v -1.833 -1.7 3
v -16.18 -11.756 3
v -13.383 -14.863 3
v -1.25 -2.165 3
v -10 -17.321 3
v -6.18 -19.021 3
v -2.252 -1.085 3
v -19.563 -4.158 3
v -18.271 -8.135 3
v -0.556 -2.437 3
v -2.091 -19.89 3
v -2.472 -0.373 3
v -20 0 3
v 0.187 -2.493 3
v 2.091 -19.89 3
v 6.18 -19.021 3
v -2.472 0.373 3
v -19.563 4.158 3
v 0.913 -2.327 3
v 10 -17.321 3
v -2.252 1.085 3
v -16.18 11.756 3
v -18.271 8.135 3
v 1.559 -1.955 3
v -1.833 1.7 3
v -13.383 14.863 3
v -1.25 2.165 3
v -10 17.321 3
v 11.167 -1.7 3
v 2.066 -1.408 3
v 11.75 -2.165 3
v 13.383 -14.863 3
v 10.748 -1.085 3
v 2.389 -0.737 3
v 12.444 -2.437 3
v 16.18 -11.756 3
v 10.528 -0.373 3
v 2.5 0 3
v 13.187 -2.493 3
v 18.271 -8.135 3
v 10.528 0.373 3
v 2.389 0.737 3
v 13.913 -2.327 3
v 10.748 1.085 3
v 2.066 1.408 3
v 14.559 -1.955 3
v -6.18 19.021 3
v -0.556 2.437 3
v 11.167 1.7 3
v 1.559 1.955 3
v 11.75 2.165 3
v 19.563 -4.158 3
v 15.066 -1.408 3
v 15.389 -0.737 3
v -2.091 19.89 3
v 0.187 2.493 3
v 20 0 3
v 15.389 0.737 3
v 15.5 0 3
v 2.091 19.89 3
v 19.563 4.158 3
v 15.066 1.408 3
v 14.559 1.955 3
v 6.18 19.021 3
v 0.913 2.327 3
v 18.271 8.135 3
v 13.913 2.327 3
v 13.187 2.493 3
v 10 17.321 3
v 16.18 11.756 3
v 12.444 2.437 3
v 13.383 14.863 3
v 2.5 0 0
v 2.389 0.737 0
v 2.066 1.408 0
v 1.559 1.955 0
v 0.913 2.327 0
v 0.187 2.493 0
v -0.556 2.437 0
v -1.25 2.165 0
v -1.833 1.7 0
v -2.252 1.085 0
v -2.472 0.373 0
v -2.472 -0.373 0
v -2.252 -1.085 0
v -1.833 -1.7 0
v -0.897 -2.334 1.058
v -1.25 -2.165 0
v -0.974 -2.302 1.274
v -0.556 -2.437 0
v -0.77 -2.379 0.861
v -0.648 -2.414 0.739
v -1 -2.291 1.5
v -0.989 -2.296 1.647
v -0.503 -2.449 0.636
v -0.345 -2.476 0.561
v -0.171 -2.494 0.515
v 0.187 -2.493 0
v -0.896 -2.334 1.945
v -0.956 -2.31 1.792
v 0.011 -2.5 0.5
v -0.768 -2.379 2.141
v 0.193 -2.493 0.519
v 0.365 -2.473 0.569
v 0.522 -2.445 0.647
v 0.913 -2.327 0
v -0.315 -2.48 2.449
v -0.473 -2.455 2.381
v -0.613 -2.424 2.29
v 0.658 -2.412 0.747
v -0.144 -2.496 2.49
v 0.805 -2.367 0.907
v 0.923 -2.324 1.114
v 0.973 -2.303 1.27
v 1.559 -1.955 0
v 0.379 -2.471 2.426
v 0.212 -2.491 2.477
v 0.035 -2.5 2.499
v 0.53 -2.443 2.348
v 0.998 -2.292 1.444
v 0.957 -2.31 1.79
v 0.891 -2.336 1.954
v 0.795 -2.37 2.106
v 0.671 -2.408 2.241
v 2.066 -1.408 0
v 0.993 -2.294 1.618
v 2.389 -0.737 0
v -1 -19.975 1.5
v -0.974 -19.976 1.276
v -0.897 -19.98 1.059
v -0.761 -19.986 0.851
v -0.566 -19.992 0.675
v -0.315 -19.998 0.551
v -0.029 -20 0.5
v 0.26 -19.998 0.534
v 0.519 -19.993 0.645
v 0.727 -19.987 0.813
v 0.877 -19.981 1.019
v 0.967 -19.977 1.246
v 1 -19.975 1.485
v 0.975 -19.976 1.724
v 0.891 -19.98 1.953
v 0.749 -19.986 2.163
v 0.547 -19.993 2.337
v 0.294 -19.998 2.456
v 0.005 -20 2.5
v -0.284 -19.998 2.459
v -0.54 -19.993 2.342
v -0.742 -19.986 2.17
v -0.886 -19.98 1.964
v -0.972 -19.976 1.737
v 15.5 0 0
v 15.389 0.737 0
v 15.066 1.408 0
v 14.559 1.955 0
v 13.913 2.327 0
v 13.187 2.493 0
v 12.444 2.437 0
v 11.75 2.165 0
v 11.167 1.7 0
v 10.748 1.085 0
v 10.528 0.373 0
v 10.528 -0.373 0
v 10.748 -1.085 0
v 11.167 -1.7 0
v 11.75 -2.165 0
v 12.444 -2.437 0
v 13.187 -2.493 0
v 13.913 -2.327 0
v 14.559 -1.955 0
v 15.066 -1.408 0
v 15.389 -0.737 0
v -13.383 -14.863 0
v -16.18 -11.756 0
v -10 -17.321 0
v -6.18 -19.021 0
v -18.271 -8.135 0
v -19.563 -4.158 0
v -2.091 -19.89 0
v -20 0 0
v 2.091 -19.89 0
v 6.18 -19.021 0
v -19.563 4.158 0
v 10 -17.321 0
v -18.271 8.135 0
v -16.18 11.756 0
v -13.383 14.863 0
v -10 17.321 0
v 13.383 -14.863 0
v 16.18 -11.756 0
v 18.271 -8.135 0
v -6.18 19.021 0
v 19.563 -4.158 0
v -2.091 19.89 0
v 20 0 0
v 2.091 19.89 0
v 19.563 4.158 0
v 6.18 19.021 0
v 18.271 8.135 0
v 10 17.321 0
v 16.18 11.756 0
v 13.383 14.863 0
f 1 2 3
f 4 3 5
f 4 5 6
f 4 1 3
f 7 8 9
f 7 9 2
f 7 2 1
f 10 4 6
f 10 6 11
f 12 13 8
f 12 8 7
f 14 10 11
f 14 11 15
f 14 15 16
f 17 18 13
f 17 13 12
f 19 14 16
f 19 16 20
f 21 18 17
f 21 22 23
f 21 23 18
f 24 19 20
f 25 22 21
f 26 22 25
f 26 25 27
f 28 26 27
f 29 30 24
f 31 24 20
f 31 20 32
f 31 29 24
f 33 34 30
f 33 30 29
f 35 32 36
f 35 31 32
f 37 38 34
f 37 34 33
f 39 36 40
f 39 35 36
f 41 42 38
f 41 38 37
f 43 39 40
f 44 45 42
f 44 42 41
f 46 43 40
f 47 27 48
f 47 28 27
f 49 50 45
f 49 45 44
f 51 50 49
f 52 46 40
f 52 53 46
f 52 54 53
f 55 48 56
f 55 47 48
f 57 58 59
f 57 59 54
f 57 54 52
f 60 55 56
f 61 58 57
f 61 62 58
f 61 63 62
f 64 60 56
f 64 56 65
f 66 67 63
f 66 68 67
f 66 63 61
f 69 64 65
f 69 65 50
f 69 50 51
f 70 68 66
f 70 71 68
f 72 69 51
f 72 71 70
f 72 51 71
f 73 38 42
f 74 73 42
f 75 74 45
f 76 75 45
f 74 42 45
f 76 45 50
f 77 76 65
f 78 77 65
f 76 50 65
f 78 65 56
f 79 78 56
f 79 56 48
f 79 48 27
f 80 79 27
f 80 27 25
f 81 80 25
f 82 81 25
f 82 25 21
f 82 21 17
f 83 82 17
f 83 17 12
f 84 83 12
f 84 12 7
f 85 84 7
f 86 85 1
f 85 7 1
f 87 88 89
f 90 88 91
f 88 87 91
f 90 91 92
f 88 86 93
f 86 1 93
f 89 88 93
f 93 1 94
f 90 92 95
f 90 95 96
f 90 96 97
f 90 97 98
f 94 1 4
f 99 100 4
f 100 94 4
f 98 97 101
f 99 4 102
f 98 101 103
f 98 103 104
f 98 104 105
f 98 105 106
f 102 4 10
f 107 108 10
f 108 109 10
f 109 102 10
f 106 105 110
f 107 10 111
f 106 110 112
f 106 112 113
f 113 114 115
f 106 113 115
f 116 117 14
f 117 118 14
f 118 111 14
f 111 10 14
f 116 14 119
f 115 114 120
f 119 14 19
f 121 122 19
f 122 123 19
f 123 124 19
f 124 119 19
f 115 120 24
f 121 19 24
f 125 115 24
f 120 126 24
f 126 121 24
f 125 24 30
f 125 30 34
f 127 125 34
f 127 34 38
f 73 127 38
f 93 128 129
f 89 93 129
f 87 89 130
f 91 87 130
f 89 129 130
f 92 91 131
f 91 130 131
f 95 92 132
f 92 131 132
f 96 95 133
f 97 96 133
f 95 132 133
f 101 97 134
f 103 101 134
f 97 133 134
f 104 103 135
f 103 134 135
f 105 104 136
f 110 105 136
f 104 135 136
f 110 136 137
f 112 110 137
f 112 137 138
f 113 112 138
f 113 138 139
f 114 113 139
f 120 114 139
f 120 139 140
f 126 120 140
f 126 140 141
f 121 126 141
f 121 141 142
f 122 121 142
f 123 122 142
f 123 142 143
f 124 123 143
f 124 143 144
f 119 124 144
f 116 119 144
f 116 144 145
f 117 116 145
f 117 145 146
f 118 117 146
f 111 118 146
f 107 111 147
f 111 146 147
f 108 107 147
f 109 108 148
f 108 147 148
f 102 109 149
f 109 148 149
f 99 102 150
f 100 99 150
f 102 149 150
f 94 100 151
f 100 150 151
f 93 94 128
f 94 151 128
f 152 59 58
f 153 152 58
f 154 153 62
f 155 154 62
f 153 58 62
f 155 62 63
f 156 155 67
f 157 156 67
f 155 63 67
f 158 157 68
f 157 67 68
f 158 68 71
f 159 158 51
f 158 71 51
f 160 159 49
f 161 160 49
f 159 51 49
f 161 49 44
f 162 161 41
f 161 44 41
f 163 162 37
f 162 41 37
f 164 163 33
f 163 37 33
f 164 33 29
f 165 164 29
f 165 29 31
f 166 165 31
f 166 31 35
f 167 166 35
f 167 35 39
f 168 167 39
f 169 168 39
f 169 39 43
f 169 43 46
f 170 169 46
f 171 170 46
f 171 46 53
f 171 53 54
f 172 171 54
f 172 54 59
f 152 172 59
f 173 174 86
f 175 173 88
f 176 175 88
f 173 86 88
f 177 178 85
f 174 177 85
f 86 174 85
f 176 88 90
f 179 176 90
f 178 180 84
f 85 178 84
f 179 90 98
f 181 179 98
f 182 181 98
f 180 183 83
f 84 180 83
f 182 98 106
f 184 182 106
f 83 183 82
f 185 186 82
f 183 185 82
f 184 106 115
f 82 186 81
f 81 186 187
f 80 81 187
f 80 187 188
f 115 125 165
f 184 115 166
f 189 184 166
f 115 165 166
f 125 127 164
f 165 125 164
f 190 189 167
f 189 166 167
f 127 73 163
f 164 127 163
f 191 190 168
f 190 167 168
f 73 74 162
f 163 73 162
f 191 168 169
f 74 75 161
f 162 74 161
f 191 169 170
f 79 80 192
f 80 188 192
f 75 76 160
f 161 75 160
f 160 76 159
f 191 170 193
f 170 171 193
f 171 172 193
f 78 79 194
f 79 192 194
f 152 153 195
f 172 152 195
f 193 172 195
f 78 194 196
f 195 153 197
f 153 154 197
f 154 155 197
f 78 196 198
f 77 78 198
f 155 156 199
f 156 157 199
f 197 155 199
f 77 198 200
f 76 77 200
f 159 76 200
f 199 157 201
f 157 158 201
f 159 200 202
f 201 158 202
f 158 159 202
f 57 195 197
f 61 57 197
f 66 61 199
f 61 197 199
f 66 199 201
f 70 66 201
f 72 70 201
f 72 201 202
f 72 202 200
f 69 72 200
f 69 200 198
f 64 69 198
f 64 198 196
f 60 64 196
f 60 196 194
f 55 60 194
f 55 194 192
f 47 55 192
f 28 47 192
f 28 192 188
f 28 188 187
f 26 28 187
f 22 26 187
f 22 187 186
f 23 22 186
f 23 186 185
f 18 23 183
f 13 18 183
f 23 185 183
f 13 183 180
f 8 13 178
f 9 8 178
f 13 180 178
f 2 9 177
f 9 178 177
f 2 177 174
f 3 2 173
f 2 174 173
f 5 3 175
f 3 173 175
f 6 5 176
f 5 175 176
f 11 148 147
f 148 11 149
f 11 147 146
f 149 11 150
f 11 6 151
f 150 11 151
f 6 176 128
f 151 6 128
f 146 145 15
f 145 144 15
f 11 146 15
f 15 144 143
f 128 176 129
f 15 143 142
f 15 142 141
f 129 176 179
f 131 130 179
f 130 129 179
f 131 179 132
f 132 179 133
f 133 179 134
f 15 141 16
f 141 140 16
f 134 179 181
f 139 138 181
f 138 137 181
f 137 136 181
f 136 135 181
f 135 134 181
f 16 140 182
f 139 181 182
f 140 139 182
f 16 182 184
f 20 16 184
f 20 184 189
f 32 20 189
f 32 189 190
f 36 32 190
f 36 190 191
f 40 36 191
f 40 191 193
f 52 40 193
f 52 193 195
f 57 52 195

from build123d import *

# Parameters (mm, degrees)
SKETCH_1_R          = 20
EXTRUDE_1_DEPTH     = 3
SKETCH_2_R          = 2.5
CUT_EXTRUDE_1_DEPTH = 29.442925307
SKETCH_4_R          = 2.5
CUT_EXTRUDE_2_DEPTH = 29.442925307
F_2_0MM_1_REACH     = 46.747
F_2_0MM_1_BORE_R    = 1


with BuildPart() as part:
    # 草图1 → 凸台-拉伸1 (new body)
    with BuildSketch(Plane.XY):
        Circle(SKETCH_1_R)
    extrude(amount=EXTRUDE_1_DEPTH)

    # 草图2 → 切除-拉伸1 (cut, through all)
    with BuildSketch(Plane.XY.offset(3)):
        Circle(SKETCH_2_R)
    extrude(amount=-CUT_EXTRUDE_1_DEPTH, mode=Mode.SUBTRACT)

    # 草图4 → 切除-拉伸2 (cut, through all)
    with BuildSketch(Plane.XY.offset(3)):
        with Locations((13, 0)):
            Circle(SKETCH_4_R)
    extrude(amount=-CUT_EXTRUDE_2_DEPTH, mode=Mode.SUBTRACT)

    # Ø2.0mm 暗销孔1 bore (on position points) → Ø2.0mm 暗销孔1 (cut, up to next)
    with BuildSketch(Plane(origin=(0, -20, 1.5), x_dir=(-1, 0, 0), z_dir=(0, -1, 0)), mode=Mode.PRIVATE) as f_2_0mm_1_sk1:
        Circle(F_2_0MM_1_BORE_R)
    f_2_0mm_1_tool1 = extrude(f_2_0mm_1_sk1.sketch, amount=-F_2_0MM_1_REACH, mode=Mode.PRIVATE) & part.part
    add(f_2_0mm_1_tool1.solids().sort_by_distance((0, -20, 1.5))[0], mode=Mode.SUBTRACT)


solid = part.part
